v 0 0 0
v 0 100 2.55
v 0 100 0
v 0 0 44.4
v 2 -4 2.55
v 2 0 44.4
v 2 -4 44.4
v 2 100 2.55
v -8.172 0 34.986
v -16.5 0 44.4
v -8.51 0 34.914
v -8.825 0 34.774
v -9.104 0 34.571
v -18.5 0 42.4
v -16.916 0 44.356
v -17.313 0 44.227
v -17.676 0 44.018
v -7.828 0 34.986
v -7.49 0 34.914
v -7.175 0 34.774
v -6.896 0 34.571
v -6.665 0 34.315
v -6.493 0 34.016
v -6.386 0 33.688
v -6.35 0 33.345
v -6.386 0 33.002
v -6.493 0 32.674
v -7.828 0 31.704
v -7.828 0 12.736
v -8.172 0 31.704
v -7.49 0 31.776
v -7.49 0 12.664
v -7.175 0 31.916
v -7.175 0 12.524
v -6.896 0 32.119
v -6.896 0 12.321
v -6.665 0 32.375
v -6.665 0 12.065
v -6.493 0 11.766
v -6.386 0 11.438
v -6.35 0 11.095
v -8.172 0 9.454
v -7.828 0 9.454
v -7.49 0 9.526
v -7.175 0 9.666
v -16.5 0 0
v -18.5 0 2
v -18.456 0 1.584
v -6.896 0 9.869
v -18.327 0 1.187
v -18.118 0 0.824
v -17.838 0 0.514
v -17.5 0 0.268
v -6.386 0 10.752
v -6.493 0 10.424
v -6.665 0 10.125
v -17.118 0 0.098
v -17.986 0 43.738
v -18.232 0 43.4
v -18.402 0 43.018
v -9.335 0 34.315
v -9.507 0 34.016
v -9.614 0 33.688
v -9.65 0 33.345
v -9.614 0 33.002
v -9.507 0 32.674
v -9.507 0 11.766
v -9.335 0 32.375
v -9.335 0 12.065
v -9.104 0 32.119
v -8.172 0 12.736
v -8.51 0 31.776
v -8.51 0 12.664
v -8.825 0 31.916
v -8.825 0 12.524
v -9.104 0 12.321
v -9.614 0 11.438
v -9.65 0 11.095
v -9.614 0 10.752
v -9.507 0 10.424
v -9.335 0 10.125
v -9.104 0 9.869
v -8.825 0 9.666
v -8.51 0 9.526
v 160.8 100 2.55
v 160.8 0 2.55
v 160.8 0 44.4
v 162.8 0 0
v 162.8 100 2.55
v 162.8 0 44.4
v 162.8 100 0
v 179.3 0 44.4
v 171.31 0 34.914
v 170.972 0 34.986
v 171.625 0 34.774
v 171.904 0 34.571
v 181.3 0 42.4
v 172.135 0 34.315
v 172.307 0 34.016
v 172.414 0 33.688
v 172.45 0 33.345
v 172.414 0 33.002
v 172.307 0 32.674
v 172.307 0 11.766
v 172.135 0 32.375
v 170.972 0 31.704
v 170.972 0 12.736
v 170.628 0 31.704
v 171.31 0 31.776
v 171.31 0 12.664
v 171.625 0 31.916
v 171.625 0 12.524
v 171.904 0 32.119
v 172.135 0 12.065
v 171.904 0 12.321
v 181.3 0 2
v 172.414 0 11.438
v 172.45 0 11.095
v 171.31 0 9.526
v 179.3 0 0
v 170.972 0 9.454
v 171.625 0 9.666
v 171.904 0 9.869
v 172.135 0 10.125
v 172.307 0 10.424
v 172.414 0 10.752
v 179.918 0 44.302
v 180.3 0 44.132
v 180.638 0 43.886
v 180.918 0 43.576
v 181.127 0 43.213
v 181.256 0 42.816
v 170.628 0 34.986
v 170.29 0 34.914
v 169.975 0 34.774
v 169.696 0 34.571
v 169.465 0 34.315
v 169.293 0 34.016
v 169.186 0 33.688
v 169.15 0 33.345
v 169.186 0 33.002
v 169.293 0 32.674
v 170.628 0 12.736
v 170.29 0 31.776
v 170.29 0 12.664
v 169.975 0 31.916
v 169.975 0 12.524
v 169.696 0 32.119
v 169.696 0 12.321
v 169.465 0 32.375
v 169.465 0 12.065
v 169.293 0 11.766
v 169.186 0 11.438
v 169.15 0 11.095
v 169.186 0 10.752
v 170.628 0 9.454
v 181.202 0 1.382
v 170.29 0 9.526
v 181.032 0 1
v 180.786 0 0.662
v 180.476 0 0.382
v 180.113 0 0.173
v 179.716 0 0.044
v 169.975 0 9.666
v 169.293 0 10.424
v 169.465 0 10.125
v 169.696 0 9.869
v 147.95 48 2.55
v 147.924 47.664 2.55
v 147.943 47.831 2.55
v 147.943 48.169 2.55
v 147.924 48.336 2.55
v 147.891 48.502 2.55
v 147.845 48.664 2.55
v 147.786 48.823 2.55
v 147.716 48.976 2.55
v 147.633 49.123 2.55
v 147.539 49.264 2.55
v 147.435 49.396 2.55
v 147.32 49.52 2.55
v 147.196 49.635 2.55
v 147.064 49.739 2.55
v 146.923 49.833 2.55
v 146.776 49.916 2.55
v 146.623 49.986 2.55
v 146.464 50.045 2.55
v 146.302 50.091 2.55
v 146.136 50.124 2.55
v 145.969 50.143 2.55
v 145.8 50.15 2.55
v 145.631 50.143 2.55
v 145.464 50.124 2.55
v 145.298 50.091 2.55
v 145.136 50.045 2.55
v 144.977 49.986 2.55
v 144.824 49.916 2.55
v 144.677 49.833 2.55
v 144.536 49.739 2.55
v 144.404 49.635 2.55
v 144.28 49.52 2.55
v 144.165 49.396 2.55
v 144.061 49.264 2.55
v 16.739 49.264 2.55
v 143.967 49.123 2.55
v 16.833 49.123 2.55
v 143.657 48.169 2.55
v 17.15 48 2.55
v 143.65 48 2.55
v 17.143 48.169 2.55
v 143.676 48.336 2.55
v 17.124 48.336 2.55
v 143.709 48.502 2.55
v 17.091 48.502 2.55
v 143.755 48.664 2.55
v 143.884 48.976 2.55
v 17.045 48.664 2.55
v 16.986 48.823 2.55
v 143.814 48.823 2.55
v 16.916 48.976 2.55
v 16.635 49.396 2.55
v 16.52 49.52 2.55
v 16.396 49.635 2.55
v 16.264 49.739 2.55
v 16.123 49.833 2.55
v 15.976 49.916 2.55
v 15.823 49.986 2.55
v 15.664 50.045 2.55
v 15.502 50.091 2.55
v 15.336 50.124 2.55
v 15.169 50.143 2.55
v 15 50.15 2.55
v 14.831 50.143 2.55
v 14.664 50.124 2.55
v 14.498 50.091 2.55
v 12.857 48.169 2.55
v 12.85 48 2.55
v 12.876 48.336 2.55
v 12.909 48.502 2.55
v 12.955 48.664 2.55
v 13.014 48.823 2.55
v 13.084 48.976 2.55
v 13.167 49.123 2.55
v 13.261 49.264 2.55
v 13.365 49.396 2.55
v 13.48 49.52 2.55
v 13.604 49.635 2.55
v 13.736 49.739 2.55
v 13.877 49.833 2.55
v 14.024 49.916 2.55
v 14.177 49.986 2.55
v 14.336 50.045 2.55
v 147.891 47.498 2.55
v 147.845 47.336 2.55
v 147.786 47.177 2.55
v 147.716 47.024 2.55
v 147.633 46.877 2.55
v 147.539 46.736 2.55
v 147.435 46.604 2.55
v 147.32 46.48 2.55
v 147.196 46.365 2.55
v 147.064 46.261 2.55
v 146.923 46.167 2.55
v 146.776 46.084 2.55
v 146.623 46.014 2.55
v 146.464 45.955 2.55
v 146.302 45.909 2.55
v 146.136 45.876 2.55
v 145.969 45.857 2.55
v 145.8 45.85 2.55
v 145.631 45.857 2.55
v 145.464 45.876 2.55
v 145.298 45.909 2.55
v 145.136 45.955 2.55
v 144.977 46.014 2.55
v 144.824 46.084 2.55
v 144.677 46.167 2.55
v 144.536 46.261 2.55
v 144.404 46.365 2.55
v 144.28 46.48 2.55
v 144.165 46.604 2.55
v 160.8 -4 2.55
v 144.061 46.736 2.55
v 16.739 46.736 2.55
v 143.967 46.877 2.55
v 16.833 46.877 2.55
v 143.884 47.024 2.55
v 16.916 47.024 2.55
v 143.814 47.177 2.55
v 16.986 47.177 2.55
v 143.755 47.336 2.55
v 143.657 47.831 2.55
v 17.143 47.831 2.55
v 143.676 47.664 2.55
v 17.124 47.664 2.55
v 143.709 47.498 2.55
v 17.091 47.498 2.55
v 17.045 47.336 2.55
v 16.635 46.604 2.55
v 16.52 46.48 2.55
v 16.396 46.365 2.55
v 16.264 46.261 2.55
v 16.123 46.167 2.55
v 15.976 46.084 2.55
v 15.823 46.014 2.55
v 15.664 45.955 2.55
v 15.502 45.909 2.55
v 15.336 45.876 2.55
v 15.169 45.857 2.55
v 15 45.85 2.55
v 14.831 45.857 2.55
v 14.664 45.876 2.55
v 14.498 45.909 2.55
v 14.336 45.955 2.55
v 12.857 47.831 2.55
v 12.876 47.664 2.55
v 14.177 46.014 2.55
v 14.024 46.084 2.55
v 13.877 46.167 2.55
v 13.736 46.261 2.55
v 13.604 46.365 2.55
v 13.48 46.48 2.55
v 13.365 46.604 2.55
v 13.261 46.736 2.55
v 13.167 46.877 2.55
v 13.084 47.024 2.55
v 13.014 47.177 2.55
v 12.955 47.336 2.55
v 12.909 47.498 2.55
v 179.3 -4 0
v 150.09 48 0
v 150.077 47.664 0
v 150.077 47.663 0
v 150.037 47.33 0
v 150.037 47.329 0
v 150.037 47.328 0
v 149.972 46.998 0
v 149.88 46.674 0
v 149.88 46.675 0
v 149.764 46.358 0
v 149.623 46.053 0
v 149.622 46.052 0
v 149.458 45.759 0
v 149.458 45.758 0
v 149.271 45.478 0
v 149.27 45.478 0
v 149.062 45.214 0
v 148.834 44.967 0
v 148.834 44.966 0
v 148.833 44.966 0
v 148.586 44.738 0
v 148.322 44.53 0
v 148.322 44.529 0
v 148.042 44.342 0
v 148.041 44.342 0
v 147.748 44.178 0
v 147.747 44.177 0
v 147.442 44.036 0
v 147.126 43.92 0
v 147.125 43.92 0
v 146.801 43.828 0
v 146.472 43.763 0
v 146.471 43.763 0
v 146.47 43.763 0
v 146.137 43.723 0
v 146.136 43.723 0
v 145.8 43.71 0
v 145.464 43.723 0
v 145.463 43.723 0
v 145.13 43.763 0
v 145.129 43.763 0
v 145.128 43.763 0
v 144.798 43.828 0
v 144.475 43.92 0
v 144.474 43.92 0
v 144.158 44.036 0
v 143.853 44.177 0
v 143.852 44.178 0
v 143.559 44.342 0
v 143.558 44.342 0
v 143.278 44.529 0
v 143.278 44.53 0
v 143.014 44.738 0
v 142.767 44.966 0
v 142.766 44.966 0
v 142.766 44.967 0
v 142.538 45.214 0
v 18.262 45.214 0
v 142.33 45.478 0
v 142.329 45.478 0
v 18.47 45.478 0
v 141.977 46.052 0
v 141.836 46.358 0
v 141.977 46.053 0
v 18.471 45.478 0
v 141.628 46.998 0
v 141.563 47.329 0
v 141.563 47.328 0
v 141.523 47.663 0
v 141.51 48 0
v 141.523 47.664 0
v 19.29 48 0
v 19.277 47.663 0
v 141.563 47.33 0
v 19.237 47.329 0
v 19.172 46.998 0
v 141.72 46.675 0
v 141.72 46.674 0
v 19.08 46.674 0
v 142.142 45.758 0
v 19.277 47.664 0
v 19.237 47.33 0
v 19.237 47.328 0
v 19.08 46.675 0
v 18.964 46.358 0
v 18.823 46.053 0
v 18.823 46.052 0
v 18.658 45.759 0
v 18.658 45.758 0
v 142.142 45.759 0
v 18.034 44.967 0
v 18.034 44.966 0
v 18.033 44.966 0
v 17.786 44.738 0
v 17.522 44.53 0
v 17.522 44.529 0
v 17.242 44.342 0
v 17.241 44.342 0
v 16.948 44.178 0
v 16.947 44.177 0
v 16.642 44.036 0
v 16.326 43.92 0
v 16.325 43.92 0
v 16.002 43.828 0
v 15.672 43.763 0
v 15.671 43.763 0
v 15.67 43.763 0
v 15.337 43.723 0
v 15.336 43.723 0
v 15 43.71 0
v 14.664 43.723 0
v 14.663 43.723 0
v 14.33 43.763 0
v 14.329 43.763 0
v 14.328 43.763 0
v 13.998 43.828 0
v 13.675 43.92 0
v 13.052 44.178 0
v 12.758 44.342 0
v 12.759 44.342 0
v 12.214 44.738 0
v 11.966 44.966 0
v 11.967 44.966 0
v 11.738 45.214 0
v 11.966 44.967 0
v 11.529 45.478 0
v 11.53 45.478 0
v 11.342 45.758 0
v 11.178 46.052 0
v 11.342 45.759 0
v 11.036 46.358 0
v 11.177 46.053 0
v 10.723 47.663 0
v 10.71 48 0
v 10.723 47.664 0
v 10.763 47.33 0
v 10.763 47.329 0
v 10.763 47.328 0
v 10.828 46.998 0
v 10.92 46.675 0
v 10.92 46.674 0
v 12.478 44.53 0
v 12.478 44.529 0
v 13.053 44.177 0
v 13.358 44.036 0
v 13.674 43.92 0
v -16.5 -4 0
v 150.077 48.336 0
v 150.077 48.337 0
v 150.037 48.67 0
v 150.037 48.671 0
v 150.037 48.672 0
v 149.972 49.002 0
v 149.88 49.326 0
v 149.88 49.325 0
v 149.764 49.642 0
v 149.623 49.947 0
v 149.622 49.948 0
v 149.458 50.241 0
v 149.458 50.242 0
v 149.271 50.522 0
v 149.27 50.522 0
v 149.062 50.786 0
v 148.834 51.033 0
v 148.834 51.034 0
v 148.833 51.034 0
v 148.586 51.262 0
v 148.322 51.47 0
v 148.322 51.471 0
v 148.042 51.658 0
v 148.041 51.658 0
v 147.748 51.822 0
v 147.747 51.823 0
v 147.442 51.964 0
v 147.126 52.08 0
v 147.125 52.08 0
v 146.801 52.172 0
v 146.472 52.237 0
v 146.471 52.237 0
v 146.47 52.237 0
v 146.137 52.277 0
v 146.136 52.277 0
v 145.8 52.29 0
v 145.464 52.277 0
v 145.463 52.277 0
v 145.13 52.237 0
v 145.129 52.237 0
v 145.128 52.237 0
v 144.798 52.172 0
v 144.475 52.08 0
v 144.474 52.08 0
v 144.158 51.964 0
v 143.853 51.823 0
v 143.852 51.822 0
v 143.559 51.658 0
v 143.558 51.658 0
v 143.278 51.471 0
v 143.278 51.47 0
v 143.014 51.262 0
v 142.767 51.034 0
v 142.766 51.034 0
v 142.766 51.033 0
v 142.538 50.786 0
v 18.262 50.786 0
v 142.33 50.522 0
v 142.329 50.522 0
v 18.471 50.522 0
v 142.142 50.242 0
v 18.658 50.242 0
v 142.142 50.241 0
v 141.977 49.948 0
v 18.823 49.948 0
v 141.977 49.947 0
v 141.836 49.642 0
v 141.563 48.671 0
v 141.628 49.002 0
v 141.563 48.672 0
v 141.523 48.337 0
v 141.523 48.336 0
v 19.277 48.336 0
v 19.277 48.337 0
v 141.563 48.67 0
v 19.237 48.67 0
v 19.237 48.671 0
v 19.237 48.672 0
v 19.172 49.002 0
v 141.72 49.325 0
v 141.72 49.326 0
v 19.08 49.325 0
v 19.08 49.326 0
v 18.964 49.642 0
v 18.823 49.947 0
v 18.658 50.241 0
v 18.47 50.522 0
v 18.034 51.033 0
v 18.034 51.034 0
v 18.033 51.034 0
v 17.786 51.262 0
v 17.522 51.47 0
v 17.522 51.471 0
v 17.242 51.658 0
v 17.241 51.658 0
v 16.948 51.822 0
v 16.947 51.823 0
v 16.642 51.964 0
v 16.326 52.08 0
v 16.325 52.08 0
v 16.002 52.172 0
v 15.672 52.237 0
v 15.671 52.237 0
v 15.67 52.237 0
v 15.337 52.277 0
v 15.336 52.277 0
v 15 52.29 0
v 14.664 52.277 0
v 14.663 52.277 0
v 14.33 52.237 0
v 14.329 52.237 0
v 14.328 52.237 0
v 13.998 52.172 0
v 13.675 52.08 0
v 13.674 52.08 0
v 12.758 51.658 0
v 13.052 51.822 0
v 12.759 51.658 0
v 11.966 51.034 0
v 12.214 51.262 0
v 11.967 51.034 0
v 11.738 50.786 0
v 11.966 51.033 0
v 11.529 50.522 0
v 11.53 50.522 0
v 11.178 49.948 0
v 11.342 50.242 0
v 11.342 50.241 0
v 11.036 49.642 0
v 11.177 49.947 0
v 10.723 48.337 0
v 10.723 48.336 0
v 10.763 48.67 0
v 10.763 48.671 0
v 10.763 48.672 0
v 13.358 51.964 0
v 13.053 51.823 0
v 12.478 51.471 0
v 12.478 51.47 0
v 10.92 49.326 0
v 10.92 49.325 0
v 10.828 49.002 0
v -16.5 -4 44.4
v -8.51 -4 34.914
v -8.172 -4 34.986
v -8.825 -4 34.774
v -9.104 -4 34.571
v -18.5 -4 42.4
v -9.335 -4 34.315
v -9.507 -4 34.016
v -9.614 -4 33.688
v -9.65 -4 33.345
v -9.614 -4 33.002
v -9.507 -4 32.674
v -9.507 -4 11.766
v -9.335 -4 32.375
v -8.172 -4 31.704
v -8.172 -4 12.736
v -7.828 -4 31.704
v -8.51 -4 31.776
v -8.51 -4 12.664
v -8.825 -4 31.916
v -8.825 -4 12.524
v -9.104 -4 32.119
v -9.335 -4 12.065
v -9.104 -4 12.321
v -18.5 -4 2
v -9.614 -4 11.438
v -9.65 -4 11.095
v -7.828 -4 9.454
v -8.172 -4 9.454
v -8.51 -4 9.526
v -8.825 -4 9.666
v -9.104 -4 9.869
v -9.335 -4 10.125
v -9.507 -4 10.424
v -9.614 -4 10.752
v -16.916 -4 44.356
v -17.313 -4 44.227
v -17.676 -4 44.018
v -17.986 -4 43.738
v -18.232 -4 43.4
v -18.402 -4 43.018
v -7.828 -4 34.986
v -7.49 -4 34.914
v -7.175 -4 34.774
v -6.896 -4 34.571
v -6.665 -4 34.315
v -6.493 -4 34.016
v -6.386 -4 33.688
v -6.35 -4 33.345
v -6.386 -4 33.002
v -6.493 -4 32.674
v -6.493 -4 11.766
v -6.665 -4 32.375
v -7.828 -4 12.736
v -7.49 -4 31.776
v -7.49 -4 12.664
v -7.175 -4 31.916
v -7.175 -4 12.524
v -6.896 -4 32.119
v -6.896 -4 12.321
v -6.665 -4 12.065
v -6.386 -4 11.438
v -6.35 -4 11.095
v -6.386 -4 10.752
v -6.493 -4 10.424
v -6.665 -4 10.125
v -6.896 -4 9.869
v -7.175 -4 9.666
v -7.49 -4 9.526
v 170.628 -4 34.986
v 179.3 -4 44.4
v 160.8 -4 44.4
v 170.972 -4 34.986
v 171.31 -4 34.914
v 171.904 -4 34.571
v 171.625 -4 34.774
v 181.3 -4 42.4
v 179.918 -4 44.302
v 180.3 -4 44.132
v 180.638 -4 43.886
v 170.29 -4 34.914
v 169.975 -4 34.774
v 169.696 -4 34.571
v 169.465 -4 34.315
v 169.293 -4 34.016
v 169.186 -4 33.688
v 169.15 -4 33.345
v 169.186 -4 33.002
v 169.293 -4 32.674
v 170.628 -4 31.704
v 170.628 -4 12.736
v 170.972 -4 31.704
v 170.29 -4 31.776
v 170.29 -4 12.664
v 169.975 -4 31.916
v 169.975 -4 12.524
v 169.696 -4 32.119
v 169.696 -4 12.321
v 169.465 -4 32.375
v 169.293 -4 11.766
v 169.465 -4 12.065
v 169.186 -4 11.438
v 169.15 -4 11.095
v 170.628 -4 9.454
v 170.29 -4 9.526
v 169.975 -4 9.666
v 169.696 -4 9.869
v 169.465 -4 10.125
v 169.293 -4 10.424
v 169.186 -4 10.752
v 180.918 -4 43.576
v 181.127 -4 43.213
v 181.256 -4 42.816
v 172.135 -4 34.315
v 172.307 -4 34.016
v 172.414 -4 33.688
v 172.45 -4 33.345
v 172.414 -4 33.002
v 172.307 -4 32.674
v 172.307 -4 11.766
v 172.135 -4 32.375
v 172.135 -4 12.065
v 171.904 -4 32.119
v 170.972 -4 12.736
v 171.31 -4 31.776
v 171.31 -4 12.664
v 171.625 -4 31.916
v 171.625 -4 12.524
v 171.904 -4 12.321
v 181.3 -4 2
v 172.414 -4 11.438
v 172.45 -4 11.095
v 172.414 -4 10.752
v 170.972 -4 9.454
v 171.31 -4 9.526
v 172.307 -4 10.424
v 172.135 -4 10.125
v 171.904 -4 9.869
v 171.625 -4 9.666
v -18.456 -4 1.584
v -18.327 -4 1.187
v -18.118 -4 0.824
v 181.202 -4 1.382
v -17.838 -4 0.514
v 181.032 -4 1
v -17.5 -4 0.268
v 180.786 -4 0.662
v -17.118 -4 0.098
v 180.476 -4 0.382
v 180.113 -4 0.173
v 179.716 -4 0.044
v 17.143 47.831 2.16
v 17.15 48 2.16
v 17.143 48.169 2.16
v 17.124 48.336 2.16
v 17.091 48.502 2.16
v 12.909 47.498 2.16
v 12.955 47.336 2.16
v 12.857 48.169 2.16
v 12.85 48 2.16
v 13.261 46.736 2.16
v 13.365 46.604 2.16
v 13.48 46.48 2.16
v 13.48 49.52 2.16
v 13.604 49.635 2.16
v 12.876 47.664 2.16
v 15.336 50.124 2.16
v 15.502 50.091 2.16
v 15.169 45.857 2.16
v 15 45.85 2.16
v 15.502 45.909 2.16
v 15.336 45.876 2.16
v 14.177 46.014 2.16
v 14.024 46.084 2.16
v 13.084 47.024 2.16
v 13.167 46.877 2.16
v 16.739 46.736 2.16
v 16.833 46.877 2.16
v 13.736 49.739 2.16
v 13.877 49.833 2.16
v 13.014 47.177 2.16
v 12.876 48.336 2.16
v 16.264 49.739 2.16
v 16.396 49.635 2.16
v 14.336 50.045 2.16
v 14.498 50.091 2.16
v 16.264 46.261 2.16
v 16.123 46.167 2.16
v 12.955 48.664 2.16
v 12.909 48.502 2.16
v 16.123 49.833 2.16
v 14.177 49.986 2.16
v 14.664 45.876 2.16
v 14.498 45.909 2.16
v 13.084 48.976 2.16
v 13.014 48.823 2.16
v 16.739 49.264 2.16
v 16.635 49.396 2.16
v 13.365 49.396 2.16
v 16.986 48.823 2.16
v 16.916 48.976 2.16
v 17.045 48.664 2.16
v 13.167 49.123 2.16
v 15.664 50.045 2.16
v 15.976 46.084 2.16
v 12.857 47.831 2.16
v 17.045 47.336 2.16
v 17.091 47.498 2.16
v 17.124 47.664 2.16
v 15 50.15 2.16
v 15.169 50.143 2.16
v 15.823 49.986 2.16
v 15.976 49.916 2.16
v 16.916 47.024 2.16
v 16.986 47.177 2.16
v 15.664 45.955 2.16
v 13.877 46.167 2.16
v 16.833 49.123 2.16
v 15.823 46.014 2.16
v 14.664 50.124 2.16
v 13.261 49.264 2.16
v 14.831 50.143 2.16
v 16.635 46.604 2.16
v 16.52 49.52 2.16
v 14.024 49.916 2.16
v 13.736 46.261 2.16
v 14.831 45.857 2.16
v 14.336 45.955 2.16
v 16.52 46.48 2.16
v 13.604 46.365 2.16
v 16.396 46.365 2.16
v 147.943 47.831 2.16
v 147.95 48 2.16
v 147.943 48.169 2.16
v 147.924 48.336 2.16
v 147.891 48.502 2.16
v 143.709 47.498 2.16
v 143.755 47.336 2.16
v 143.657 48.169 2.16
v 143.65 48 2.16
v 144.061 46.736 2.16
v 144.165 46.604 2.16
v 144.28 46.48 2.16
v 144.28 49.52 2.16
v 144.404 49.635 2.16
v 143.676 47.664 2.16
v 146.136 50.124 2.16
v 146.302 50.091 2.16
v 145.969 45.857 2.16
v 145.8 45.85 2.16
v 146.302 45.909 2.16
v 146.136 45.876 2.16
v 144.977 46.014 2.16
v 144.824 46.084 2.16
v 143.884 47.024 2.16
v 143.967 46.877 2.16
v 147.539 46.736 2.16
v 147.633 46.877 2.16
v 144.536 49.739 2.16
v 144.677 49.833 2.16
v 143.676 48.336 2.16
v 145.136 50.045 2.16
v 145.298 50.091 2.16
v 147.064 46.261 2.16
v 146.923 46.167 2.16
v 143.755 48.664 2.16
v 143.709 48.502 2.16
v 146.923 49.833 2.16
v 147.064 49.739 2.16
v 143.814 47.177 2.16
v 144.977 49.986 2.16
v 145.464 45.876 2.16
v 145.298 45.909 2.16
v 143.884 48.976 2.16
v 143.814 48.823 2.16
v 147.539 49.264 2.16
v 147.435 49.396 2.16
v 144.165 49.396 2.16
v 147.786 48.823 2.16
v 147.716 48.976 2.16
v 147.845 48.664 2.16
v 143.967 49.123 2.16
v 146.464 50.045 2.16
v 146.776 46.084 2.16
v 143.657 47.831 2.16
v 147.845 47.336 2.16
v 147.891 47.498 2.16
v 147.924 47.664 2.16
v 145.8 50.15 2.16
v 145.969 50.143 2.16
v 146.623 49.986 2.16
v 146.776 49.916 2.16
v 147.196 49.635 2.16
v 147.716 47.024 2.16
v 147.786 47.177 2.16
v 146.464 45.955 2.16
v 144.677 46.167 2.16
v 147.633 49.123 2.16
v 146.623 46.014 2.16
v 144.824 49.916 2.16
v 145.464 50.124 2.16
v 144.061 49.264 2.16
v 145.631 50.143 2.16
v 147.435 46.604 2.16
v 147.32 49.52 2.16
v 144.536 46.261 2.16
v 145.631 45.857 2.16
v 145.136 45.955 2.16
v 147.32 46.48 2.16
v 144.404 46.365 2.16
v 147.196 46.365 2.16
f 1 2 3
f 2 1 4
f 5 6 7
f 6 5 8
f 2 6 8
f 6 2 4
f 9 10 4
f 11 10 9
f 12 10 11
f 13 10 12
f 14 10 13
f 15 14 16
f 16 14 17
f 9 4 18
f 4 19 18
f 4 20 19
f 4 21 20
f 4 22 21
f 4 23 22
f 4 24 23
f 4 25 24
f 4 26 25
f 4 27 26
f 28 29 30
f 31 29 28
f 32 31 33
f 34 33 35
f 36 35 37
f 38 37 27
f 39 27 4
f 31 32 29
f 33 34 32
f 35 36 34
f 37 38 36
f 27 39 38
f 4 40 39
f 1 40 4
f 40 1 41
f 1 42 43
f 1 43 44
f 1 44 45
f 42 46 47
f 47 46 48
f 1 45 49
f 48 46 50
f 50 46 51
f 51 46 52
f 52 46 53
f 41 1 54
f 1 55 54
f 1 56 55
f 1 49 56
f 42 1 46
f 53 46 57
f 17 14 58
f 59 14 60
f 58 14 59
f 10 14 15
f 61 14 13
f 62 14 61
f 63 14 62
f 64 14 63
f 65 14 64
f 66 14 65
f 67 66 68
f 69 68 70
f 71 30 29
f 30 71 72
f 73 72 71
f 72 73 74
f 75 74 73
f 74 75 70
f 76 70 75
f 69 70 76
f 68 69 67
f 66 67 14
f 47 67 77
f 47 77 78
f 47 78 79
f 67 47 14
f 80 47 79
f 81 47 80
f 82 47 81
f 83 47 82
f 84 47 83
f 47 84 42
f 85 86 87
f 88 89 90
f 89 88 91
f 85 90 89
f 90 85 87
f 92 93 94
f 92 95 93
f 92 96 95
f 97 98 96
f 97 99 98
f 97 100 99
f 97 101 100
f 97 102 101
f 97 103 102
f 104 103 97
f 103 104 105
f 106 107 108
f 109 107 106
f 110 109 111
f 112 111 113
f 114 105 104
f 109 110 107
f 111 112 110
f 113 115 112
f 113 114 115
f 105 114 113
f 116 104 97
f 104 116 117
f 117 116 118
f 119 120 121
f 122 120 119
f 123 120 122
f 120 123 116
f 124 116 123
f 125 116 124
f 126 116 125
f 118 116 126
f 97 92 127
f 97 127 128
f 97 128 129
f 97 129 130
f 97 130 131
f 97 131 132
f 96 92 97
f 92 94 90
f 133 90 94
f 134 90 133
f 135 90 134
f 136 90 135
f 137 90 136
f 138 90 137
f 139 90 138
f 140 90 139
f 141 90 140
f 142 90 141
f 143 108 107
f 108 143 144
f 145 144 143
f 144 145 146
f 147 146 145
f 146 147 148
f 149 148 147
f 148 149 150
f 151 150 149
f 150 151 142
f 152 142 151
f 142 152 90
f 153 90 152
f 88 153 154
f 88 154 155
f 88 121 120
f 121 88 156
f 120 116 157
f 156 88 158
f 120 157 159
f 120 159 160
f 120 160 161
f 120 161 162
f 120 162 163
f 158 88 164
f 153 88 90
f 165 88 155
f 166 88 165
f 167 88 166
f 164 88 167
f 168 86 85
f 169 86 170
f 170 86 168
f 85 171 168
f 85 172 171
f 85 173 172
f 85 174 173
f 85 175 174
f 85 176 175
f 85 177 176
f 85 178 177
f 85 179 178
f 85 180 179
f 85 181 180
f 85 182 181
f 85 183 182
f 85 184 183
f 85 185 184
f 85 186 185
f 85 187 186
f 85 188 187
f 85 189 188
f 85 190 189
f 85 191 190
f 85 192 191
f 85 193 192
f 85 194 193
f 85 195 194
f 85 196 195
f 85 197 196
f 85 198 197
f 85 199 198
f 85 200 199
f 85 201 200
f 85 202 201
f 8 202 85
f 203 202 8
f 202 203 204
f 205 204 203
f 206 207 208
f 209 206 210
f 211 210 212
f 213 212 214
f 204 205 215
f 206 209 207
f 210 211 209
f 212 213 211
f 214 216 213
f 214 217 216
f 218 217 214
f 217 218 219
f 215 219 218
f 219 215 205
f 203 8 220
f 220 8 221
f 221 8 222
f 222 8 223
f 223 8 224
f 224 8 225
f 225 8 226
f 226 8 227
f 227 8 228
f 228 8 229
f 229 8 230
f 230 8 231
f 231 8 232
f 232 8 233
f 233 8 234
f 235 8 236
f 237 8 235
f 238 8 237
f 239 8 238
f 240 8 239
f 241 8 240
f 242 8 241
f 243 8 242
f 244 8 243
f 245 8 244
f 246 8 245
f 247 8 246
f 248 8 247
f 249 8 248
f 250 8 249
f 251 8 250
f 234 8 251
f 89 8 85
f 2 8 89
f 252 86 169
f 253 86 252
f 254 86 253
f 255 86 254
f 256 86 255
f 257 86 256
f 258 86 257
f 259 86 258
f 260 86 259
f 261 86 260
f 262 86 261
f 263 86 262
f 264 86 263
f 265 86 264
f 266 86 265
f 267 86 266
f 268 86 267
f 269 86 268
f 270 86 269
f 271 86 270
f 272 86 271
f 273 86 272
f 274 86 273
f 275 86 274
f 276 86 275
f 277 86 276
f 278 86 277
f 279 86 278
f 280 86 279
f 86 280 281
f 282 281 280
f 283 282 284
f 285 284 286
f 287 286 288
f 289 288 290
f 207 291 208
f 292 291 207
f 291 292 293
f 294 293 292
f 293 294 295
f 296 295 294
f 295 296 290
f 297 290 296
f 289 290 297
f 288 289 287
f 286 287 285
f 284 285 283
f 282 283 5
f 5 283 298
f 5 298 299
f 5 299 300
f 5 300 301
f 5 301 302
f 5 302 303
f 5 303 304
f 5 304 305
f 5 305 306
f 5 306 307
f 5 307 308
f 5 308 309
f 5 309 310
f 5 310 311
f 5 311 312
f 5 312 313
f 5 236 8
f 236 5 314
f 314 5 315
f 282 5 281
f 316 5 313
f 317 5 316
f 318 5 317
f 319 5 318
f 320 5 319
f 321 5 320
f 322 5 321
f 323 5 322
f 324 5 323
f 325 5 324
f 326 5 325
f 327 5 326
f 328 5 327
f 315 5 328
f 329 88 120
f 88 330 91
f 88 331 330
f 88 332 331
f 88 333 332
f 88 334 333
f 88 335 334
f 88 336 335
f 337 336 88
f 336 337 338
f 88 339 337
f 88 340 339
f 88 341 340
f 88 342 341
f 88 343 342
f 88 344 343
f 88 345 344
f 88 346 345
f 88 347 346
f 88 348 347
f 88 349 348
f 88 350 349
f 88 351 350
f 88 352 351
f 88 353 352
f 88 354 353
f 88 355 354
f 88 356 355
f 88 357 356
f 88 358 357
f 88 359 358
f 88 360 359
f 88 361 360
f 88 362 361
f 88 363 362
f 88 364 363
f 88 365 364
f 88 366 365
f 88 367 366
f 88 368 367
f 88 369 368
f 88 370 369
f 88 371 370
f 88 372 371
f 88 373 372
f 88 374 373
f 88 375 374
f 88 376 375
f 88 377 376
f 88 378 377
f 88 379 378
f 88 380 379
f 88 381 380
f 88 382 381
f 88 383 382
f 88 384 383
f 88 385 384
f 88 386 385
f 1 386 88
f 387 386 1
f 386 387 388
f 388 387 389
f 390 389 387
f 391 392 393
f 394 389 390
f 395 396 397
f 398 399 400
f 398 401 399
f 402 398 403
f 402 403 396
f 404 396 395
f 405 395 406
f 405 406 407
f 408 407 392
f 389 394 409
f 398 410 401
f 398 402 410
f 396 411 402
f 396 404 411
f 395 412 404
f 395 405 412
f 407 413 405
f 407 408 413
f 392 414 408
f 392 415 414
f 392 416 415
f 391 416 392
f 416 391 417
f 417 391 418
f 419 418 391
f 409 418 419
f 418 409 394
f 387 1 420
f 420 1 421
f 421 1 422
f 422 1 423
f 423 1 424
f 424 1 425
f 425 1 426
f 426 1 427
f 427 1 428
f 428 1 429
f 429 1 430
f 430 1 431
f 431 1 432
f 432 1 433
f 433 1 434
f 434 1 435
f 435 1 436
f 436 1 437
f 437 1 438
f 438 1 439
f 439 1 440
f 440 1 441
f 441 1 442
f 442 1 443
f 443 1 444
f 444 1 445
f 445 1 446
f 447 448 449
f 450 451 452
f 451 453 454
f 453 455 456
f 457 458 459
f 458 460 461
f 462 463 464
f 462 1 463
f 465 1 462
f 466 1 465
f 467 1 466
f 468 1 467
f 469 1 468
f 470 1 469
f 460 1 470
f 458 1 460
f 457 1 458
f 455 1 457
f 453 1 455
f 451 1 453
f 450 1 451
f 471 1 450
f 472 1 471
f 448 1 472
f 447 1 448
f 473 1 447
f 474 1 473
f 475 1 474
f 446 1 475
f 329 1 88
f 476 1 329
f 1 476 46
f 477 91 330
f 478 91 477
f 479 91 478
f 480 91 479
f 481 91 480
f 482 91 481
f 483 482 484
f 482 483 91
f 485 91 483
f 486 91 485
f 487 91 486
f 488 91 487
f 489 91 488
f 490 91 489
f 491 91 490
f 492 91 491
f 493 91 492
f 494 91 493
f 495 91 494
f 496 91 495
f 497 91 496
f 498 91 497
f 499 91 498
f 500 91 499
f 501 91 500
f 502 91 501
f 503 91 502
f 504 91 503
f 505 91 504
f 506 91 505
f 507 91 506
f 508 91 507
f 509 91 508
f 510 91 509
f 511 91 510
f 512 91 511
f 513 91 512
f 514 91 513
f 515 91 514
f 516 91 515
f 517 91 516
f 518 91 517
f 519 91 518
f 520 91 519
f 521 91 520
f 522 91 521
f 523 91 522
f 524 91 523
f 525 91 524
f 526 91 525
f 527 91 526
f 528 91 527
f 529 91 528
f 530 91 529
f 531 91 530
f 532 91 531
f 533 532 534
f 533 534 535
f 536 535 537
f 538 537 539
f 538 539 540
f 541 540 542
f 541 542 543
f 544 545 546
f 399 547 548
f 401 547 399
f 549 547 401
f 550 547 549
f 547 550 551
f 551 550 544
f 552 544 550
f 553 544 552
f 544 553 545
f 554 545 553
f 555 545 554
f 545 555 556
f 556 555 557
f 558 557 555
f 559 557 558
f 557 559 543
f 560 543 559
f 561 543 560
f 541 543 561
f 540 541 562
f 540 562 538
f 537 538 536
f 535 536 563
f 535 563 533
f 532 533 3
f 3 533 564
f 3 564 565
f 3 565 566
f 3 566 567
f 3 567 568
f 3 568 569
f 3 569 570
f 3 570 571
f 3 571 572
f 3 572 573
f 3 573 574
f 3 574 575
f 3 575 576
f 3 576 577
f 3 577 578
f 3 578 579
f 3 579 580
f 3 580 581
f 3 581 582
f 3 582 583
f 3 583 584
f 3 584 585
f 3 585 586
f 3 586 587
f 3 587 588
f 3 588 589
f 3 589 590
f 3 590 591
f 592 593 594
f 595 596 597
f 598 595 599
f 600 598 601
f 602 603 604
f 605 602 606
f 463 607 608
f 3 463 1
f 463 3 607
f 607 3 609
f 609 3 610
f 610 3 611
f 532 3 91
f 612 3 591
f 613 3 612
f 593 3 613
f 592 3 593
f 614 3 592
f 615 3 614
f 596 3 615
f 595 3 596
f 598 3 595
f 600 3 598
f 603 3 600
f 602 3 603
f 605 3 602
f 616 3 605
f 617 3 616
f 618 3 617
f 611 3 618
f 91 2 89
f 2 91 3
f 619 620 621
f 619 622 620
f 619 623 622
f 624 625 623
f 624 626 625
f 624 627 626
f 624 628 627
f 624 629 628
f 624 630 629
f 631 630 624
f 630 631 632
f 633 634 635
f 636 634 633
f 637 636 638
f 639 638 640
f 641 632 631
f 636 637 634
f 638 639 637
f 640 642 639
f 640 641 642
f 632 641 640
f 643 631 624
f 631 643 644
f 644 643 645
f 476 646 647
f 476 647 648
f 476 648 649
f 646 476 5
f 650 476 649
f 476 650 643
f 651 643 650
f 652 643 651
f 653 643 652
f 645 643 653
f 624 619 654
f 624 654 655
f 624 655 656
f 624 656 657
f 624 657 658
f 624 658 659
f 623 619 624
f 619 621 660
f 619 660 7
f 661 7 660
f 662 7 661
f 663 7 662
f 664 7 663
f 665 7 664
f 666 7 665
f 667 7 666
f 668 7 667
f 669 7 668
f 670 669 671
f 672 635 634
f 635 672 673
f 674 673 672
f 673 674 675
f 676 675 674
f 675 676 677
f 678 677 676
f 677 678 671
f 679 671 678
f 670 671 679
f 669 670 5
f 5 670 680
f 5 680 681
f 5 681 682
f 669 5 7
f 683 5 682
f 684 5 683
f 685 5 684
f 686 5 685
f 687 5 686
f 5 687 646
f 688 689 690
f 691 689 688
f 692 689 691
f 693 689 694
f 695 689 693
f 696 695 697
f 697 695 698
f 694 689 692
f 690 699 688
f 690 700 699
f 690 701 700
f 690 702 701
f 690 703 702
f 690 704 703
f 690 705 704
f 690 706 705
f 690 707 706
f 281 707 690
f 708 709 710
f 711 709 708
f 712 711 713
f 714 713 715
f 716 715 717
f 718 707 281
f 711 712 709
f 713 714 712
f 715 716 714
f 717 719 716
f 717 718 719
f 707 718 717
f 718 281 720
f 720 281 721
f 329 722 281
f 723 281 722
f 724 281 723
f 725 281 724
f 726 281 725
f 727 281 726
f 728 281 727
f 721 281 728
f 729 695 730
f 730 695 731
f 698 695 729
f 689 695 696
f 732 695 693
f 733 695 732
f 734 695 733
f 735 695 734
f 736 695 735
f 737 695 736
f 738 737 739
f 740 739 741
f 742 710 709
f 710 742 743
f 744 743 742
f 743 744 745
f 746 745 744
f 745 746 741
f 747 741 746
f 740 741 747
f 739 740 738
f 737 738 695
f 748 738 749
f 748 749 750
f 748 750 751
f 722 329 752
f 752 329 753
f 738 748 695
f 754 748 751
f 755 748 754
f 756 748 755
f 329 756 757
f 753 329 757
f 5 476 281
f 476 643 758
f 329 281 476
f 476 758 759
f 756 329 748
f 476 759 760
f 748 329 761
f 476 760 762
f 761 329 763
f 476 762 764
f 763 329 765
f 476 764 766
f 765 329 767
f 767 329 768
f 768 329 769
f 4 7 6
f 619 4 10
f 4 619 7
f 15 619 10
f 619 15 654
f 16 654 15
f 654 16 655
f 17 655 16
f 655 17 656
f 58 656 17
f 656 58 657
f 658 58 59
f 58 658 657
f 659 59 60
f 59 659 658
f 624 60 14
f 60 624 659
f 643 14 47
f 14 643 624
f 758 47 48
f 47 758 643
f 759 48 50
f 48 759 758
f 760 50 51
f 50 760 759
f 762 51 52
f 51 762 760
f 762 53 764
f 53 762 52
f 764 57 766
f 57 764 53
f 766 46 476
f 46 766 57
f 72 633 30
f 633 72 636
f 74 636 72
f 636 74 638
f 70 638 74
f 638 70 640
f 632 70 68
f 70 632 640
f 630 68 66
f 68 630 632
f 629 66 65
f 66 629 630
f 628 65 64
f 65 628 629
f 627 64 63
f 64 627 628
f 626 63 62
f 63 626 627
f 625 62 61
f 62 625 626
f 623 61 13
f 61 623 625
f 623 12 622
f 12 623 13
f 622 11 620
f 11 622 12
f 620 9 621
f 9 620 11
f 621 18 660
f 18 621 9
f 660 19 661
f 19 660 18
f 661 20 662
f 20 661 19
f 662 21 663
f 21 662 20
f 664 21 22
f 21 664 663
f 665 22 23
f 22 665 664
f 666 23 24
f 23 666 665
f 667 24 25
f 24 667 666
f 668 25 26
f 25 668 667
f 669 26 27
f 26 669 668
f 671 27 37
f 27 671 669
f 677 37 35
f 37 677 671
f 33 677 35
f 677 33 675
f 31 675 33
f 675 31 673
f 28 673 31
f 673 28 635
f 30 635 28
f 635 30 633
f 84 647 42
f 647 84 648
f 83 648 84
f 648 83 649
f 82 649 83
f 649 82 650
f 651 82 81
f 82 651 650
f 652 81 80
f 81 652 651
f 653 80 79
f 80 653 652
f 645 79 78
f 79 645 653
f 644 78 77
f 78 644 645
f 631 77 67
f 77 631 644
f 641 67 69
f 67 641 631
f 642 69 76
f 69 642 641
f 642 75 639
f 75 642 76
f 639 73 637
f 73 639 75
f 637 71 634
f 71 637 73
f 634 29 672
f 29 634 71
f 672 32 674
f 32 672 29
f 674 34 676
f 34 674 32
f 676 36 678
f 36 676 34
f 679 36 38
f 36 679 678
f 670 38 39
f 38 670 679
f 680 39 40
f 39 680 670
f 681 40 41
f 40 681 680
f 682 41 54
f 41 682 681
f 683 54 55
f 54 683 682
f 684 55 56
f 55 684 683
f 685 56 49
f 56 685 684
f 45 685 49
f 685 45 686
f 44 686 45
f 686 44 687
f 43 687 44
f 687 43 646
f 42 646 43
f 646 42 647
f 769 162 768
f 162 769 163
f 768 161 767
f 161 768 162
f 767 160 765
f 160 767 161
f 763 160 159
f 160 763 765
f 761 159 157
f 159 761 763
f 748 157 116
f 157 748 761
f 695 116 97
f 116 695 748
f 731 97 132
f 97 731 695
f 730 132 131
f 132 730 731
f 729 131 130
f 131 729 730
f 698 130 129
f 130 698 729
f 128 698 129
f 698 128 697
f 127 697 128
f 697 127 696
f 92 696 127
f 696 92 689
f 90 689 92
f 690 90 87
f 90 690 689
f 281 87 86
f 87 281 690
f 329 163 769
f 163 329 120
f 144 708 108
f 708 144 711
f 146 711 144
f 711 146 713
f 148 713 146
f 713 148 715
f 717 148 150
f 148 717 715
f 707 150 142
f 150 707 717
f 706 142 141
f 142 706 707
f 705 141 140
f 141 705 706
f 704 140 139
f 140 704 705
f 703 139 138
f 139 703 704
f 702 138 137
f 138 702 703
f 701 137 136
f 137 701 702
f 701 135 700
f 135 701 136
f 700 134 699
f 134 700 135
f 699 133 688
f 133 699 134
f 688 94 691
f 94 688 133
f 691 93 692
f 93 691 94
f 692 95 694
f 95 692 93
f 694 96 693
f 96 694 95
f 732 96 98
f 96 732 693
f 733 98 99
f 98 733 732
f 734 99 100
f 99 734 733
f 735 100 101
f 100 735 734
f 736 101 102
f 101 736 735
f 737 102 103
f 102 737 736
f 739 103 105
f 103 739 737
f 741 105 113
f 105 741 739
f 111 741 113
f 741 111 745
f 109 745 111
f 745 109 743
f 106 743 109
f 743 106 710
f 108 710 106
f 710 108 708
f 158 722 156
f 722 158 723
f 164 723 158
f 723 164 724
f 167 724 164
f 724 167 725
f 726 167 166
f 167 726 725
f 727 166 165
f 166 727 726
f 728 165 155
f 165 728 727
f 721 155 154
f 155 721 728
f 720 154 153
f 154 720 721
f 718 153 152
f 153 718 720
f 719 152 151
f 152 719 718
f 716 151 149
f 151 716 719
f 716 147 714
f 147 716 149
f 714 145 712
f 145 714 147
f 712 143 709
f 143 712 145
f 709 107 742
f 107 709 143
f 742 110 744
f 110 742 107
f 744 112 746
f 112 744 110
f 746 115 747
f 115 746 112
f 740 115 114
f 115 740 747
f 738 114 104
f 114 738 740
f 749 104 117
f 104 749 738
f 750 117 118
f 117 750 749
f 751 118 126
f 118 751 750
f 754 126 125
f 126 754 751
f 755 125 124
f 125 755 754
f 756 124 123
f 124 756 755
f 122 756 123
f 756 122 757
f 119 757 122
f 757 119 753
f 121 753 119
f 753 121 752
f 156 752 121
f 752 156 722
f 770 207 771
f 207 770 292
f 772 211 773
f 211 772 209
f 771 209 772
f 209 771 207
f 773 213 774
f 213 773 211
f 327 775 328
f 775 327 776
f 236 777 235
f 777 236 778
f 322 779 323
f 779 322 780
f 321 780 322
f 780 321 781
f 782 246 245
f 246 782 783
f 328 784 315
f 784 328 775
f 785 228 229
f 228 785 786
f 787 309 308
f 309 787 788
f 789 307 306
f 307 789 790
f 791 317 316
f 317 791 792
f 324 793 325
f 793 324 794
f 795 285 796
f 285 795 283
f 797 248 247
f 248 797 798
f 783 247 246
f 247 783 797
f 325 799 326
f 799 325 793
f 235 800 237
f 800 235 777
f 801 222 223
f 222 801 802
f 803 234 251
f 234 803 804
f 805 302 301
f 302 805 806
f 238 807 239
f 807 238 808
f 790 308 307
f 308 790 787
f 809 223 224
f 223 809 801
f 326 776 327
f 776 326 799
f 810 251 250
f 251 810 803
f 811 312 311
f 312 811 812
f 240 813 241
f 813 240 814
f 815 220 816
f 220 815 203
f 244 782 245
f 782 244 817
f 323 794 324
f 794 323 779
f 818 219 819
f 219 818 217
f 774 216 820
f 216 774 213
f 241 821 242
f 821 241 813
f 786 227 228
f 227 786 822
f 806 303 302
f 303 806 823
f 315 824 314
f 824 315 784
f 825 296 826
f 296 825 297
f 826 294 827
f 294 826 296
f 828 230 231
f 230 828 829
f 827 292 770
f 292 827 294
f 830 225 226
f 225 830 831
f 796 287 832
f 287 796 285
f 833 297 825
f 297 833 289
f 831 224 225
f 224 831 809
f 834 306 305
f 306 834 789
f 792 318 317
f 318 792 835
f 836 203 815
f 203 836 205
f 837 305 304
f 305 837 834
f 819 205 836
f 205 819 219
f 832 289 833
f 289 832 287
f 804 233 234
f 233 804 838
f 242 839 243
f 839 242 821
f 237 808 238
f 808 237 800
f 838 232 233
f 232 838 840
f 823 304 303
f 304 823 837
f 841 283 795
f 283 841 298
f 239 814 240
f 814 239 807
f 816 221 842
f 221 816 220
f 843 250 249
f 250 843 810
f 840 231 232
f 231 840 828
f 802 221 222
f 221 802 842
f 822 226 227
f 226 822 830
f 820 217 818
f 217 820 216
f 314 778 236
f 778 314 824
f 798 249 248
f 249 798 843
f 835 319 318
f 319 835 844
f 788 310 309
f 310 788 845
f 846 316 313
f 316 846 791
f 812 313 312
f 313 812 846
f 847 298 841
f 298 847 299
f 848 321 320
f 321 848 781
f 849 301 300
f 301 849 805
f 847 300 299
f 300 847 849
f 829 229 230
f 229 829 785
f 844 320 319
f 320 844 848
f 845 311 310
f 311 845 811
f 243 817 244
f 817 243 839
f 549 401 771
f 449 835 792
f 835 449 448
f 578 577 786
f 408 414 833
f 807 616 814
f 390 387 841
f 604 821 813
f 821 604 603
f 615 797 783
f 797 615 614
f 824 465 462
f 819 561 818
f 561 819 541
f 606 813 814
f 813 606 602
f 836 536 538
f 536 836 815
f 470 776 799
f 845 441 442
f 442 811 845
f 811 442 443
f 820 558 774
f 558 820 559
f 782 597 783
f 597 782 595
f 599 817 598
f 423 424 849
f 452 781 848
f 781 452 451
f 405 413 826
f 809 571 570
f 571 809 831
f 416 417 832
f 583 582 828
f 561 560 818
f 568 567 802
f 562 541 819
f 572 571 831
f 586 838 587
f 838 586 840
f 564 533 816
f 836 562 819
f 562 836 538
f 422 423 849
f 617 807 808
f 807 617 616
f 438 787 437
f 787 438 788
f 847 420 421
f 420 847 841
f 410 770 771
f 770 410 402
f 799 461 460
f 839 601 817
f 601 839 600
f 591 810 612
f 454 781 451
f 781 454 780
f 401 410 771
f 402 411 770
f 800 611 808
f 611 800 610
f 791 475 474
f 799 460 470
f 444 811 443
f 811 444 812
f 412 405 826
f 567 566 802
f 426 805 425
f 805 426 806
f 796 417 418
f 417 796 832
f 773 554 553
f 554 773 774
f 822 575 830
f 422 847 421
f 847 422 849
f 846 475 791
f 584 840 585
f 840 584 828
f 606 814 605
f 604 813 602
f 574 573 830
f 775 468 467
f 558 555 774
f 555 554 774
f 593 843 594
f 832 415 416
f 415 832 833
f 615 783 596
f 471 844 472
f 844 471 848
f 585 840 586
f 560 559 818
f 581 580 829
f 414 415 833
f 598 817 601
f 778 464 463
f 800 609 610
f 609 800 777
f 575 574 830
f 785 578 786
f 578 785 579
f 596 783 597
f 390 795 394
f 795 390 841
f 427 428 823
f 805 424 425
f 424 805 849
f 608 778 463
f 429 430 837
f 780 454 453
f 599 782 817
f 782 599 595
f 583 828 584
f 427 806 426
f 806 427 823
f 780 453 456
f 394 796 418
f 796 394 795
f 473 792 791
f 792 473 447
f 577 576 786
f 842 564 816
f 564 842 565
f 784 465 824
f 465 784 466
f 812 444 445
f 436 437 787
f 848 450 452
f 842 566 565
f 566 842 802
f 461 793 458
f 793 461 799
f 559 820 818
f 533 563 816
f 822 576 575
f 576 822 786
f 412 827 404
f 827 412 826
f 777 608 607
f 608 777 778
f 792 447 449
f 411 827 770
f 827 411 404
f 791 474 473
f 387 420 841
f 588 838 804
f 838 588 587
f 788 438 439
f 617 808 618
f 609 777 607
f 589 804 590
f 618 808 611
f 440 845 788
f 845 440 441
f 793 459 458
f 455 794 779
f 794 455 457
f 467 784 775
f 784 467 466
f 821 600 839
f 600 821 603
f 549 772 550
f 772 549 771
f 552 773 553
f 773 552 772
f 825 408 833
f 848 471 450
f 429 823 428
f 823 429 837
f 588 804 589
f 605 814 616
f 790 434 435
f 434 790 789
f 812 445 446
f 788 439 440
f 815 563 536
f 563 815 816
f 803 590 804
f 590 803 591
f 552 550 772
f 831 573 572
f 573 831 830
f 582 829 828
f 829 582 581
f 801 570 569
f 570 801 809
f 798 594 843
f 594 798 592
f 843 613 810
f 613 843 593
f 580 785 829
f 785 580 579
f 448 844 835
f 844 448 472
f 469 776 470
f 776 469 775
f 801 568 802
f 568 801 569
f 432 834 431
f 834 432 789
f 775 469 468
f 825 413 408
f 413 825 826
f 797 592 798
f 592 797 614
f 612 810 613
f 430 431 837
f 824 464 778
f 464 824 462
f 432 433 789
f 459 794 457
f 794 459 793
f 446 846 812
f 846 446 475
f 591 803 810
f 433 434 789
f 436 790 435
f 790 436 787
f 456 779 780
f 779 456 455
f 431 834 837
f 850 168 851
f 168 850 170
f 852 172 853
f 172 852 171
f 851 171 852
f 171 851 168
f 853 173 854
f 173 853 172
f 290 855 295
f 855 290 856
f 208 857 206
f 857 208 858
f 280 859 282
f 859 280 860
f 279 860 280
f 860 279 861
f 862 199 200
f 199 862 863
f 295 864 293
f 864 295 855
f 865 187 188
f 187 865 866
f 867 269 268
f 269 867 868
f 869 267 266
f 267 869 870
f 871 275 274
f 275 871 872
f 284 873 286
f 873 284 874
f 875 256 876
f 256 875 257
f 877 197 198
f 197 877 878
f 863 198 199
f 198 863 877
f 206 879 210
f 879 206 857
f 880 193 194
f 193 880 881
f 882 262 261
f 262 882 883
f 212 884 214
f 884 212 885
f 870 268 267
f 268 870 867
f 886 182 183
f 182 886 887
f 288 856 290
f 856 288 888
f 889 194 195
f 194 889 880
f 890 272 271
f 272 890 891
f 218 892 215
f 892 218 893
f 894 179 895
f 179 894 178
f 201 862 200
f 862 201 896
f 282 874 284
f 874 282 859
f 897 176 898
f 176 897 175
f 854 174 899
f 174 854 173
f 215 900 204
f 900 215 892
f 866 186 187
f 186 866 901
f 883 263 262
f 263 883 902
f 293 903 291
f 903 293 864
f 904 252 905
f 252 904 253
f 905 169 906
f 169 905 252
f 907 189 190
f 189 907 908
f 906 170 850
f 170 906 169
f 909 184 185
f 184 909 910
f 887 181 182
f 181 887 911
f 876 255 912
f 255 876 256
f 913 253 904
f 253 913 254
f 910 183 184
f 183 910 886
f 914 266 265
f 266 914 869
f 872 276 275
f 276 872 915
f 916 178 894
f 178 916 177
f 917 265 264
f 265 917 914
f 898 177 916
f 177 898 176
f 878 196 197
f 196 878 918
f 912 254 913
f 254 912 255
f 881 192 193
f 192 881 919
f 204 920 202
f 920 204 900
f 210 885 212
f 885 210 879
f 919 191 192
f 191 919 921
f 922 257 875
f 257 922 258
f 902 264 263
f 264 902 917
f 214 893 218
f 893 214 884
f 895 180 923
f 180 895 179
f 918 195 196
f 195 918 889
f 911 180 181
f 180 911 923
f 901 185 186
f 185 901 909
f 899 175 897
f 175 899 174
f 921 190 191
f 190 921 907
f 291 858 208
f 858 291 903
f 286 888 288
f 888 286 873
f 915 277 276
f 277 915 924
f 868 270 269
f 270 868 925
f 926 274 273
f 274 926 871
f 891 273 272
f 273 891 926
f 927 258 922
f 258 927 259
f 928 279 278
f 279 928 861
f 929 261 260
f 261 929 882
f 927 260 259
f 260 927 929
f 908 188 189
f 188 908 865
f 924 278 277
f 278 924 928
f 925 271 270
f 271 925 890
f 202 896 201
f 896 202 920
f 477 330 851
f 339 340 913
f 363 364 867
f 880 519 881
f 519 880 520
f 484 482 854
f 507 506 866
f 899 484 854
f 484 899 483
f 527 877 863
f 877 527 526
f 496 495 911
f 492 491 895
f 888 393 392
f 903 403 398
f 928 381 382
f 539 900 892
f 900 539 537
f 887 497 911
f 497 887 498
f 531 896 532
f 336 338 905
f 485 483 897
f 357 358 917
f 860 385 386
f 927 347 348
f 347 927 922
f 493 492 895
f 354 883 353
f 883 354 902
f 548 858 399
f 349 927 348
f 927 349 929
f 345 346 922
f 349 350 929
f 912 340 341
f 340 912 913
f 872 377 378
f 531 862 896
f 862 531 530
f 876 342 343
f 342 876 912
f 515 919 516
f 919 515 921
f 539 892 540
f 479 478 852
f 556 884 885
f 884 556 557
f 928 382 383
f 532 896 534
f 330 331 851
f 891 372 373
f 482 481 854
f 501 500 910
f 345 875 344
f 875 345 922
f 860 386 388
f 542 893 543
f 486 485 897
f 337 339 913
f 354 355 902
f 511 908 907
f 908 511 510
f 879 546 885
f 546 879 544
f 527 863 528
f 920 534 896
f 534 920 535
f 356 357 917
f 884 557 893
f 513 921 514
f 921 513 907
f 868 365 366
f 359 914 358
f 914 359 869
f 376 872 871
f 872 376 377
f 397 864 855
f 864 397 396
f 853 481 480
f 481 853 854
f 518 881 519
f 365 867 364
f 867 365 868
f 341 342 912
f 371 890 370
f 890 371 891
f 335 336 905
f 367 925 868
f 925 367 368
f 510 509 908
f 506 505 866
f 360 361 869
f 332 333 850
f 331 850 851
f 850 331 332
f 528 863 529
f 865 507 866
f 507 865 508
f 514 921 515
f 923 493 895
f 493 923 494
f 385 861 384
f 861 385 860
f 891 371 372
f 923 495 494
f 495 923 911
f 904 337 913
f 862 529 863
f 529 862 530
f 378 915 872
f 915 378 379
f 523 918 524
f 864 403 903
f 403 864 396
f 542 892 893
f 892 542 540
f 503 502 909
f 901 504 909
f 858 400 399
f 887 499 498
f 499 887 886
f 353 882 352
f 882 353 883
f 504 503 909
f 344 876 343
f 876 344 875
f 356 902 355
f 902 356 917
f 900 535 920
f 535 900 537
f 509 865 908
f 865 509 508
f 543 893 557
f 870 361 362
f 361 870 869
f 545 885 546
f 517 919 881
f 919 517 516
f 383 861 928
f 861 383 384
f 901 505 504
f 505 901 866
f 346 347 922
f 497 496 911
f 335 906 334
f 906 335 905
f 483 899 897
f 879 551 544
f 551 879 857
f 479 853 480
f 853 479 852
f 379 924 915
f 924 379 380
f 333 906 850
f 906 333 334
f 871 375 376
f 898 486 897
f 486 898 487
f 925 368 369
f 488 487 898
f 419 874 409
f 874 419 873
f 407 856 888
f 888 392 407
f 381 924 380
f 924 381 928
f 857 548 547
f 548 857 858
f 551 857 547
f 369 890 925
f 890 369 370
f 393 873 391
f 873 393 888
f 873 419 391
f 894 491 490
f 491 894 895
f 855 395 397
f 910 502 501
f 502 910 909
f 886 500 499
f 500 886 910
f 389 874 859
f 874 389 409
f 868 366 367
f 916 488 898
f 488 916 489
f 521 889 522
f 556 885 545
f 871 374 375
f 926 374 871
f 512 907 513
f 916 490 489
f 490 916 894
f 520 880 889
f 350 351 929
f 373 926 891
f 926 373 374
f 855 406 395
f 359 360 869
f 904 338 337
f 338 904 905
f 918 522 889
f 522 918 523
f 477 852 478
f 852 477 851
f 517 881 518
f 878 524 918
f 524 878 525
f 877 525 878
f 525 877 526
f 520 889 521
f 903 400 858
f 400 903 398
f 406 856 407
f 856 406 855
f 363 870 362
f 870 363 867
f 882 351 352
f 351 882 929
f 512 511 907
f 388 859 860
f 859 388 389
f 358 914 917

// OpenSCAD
// file: microlab-2.scad
/* [Hidden] */
ML2_FRAME_THICKNESS = 4;
ML2_FRAME_RADIUS = 2;
ML2_FRAME_HEIGHT = 44.4;
ML2_FRAME_HEIGHT_GAP = 0.10;
ML2_FRAME_SIDE_WIDTH_INSIDE = 18.5;
ML2_FRAME_WIDTH_INSIDE = 162.8;
ML2_FRAME_HOLE_FROM_EDGE = 10.5;
ML2_FRAME_HOLE2_FROM_BOTTOM = 33.345;
ML2_FRAME_HOLE1_FROM_BOTTOM = 11.095;
ML2_FRAME_HOLE_DIA = 3.3;

function HeightFromNumberUnits(numberUnits) =
    numberUnits * ML2_FRAME_HEIGHT + (numberUnits-1) * ML2_FRAME_HEIGHT_GAP;

//FrontPlate(1, showRear=false, openFace=true, valign="left", halign="bottom") {
//    Shelf();
//}

module FrontPlate(numberUnits = 1, showRear=false, openFace=false, valign="bottom", halign="inside-left") {
    totalWidth = ML2_FRAME_WIDTH_INSIDE + 2 * ML2_FRAME_SIDE_WIDTH_INSIDE;
    height = HeightFromNumberUnits(numberUnits);
    
    x = halign == "center" ? totalWidth/2
        : halign == "inside-left" ? ML2_FRAME_SIDE_WIDTH_INSIDE
        : halign == "inside-right" ? totalWidth - ML2_FRAME_SIDE_WIDTH_INSIDE
        : 0;

    z = valign == "top" ? height
        : valign == "middle" ? height/2
        : 0;
    
    translate([-x,0,-z]) {
        rotate([90,0,0]) {
            linear_extrude(ML2_FRAME_THICKNESS)
                difference() {
                    // Front plate
                    if (openFace) {
                        union() {
                            w = ML2_FRAME_SIDE_WIDTH_INSIDE + 2;
                            // Left
                            offset(ML2_FRAME_RADIUS, $fn=30) offset(-ML2_FRAME_RADIUS)
                                square([w, height]);
                            translate([w- ML2_FRAME_RADIUS,0,0]) square([ML2_FRAME_RADIUS, height]);
                            // Right
                            translate([totalWidth - w,0,0]) {
                            offset(ML2_FRAME_RADIUS, $fn=30) offset(-ML2_FRAME_RADIUS)
                                square([w, height]);
                            square([ML2_FRAME_RADIUS, height]);
                            }
                        }
                    } else {
                        offset(ML2_FRAME_RADIUS, $fn=30) offset(-ML2_FRAME_RADIUS)
                            square([totalWidth, height]);
                    }
                    // Fixing holes
                    for (y = [0:numberUnits-1]) translate([0,y * (ML2_FRAME_HEIGHT + ML2_FRAME_HEIGHT_GAP),0]) {
                        translate([ML2_FRAME_HOLE_FROM_EDGE, ML2_FRAME_HOLE1_FROM_BOTTOM]) circle(d=ML2_FRAME_HOLE_DIA, $fn=30);
                        translate([ML2_FRAME_HOLE_FROM_EDGE, ML2_FRAME_HOLE2_FROM_BOTTOM]) circle(d=ML2_FRAME_HOLE_DIA, $fn=30);
                        translate([totalWidth-ML2_FRAME_HOLE_FROM_EDGE, ML2_FRAME_HOLE1_FROM_BOTTOM]) circle(d=ML2_FRAME_HOLE_DIA, $fn=30);
                        translate([totalWidth-ML2_FRAME_HOLE_FROM_EDGE, ML2_FRAME_HOLE2_FROM_BOTTOM]) circle(d=ML2_FRAME_HOLE_DIA, $fn=30);
                    }
                }
        }
        if (showRear) {
            %translate([ML2_FRAME_SIDE_WIDTH_INSIDE,0,0]) cube([ML2_FRAME_WIDTH_INSIDE, 100, height]);
        }
        children();
    }
}

module Shelf(numberUnits = 1, depth=100, shelfThickness=2.55, supportThickness=2) {
    height = HeightFromNumberUnits(numberUnits);
    translate([ML2_FRAME_SIDE_WIDTH_INSIDE,0,0]) {
        translate([0,-ML2_FRAME_THICKNESS,0]) cube([ML2_FRAME_WIDTH_INSIDE, depth + ML2_FRAME_THICKNESS, shelfThickness]);
        for (x = [0, ML2_FRAME_WIDTH_INSIDE - supportThickness]) {
            translate([x,0,0])
                rotate([90,0,90]) linear_extrude(supportThickness) polygon([
                    [0, shelfThickness],
                    [0, height],
                    [depth, shelfThickness],
                ]);
        }
    }
}
// main file
include <microlab-2.scad>

SupportThickness = 2;
ShelfThickness = 2.55;

DIN_SCREW_DIA = 4.3;

// Requires 2x M6 10mm Countersunk machine screws and 2x nuts

$fn = 80;

difference() {
    FrontPlate(1, showRear=false, openFace=true, halign="inside-left") {
        Shelf(shelfThickness=ShelfThickness, supportThickness=SupportThickness);
    }
    // DIN Rail mounting holes
    for (x =[15, ML2_FRAME_WIDTH_INSIDE-15-2]) {
        translate([x,48,-0.01]) {
            // Hole
            cylinder(d=DIN_SCREW_DIA, h=ShelfThickness+0.02);
            // Countersink
            cylinder(r1=DIN_SCREW_DIA, r2=DIN_SCREW_DIA/2, h=DIN_SCREW_DIA/2+0.02);
        }
    }
};
